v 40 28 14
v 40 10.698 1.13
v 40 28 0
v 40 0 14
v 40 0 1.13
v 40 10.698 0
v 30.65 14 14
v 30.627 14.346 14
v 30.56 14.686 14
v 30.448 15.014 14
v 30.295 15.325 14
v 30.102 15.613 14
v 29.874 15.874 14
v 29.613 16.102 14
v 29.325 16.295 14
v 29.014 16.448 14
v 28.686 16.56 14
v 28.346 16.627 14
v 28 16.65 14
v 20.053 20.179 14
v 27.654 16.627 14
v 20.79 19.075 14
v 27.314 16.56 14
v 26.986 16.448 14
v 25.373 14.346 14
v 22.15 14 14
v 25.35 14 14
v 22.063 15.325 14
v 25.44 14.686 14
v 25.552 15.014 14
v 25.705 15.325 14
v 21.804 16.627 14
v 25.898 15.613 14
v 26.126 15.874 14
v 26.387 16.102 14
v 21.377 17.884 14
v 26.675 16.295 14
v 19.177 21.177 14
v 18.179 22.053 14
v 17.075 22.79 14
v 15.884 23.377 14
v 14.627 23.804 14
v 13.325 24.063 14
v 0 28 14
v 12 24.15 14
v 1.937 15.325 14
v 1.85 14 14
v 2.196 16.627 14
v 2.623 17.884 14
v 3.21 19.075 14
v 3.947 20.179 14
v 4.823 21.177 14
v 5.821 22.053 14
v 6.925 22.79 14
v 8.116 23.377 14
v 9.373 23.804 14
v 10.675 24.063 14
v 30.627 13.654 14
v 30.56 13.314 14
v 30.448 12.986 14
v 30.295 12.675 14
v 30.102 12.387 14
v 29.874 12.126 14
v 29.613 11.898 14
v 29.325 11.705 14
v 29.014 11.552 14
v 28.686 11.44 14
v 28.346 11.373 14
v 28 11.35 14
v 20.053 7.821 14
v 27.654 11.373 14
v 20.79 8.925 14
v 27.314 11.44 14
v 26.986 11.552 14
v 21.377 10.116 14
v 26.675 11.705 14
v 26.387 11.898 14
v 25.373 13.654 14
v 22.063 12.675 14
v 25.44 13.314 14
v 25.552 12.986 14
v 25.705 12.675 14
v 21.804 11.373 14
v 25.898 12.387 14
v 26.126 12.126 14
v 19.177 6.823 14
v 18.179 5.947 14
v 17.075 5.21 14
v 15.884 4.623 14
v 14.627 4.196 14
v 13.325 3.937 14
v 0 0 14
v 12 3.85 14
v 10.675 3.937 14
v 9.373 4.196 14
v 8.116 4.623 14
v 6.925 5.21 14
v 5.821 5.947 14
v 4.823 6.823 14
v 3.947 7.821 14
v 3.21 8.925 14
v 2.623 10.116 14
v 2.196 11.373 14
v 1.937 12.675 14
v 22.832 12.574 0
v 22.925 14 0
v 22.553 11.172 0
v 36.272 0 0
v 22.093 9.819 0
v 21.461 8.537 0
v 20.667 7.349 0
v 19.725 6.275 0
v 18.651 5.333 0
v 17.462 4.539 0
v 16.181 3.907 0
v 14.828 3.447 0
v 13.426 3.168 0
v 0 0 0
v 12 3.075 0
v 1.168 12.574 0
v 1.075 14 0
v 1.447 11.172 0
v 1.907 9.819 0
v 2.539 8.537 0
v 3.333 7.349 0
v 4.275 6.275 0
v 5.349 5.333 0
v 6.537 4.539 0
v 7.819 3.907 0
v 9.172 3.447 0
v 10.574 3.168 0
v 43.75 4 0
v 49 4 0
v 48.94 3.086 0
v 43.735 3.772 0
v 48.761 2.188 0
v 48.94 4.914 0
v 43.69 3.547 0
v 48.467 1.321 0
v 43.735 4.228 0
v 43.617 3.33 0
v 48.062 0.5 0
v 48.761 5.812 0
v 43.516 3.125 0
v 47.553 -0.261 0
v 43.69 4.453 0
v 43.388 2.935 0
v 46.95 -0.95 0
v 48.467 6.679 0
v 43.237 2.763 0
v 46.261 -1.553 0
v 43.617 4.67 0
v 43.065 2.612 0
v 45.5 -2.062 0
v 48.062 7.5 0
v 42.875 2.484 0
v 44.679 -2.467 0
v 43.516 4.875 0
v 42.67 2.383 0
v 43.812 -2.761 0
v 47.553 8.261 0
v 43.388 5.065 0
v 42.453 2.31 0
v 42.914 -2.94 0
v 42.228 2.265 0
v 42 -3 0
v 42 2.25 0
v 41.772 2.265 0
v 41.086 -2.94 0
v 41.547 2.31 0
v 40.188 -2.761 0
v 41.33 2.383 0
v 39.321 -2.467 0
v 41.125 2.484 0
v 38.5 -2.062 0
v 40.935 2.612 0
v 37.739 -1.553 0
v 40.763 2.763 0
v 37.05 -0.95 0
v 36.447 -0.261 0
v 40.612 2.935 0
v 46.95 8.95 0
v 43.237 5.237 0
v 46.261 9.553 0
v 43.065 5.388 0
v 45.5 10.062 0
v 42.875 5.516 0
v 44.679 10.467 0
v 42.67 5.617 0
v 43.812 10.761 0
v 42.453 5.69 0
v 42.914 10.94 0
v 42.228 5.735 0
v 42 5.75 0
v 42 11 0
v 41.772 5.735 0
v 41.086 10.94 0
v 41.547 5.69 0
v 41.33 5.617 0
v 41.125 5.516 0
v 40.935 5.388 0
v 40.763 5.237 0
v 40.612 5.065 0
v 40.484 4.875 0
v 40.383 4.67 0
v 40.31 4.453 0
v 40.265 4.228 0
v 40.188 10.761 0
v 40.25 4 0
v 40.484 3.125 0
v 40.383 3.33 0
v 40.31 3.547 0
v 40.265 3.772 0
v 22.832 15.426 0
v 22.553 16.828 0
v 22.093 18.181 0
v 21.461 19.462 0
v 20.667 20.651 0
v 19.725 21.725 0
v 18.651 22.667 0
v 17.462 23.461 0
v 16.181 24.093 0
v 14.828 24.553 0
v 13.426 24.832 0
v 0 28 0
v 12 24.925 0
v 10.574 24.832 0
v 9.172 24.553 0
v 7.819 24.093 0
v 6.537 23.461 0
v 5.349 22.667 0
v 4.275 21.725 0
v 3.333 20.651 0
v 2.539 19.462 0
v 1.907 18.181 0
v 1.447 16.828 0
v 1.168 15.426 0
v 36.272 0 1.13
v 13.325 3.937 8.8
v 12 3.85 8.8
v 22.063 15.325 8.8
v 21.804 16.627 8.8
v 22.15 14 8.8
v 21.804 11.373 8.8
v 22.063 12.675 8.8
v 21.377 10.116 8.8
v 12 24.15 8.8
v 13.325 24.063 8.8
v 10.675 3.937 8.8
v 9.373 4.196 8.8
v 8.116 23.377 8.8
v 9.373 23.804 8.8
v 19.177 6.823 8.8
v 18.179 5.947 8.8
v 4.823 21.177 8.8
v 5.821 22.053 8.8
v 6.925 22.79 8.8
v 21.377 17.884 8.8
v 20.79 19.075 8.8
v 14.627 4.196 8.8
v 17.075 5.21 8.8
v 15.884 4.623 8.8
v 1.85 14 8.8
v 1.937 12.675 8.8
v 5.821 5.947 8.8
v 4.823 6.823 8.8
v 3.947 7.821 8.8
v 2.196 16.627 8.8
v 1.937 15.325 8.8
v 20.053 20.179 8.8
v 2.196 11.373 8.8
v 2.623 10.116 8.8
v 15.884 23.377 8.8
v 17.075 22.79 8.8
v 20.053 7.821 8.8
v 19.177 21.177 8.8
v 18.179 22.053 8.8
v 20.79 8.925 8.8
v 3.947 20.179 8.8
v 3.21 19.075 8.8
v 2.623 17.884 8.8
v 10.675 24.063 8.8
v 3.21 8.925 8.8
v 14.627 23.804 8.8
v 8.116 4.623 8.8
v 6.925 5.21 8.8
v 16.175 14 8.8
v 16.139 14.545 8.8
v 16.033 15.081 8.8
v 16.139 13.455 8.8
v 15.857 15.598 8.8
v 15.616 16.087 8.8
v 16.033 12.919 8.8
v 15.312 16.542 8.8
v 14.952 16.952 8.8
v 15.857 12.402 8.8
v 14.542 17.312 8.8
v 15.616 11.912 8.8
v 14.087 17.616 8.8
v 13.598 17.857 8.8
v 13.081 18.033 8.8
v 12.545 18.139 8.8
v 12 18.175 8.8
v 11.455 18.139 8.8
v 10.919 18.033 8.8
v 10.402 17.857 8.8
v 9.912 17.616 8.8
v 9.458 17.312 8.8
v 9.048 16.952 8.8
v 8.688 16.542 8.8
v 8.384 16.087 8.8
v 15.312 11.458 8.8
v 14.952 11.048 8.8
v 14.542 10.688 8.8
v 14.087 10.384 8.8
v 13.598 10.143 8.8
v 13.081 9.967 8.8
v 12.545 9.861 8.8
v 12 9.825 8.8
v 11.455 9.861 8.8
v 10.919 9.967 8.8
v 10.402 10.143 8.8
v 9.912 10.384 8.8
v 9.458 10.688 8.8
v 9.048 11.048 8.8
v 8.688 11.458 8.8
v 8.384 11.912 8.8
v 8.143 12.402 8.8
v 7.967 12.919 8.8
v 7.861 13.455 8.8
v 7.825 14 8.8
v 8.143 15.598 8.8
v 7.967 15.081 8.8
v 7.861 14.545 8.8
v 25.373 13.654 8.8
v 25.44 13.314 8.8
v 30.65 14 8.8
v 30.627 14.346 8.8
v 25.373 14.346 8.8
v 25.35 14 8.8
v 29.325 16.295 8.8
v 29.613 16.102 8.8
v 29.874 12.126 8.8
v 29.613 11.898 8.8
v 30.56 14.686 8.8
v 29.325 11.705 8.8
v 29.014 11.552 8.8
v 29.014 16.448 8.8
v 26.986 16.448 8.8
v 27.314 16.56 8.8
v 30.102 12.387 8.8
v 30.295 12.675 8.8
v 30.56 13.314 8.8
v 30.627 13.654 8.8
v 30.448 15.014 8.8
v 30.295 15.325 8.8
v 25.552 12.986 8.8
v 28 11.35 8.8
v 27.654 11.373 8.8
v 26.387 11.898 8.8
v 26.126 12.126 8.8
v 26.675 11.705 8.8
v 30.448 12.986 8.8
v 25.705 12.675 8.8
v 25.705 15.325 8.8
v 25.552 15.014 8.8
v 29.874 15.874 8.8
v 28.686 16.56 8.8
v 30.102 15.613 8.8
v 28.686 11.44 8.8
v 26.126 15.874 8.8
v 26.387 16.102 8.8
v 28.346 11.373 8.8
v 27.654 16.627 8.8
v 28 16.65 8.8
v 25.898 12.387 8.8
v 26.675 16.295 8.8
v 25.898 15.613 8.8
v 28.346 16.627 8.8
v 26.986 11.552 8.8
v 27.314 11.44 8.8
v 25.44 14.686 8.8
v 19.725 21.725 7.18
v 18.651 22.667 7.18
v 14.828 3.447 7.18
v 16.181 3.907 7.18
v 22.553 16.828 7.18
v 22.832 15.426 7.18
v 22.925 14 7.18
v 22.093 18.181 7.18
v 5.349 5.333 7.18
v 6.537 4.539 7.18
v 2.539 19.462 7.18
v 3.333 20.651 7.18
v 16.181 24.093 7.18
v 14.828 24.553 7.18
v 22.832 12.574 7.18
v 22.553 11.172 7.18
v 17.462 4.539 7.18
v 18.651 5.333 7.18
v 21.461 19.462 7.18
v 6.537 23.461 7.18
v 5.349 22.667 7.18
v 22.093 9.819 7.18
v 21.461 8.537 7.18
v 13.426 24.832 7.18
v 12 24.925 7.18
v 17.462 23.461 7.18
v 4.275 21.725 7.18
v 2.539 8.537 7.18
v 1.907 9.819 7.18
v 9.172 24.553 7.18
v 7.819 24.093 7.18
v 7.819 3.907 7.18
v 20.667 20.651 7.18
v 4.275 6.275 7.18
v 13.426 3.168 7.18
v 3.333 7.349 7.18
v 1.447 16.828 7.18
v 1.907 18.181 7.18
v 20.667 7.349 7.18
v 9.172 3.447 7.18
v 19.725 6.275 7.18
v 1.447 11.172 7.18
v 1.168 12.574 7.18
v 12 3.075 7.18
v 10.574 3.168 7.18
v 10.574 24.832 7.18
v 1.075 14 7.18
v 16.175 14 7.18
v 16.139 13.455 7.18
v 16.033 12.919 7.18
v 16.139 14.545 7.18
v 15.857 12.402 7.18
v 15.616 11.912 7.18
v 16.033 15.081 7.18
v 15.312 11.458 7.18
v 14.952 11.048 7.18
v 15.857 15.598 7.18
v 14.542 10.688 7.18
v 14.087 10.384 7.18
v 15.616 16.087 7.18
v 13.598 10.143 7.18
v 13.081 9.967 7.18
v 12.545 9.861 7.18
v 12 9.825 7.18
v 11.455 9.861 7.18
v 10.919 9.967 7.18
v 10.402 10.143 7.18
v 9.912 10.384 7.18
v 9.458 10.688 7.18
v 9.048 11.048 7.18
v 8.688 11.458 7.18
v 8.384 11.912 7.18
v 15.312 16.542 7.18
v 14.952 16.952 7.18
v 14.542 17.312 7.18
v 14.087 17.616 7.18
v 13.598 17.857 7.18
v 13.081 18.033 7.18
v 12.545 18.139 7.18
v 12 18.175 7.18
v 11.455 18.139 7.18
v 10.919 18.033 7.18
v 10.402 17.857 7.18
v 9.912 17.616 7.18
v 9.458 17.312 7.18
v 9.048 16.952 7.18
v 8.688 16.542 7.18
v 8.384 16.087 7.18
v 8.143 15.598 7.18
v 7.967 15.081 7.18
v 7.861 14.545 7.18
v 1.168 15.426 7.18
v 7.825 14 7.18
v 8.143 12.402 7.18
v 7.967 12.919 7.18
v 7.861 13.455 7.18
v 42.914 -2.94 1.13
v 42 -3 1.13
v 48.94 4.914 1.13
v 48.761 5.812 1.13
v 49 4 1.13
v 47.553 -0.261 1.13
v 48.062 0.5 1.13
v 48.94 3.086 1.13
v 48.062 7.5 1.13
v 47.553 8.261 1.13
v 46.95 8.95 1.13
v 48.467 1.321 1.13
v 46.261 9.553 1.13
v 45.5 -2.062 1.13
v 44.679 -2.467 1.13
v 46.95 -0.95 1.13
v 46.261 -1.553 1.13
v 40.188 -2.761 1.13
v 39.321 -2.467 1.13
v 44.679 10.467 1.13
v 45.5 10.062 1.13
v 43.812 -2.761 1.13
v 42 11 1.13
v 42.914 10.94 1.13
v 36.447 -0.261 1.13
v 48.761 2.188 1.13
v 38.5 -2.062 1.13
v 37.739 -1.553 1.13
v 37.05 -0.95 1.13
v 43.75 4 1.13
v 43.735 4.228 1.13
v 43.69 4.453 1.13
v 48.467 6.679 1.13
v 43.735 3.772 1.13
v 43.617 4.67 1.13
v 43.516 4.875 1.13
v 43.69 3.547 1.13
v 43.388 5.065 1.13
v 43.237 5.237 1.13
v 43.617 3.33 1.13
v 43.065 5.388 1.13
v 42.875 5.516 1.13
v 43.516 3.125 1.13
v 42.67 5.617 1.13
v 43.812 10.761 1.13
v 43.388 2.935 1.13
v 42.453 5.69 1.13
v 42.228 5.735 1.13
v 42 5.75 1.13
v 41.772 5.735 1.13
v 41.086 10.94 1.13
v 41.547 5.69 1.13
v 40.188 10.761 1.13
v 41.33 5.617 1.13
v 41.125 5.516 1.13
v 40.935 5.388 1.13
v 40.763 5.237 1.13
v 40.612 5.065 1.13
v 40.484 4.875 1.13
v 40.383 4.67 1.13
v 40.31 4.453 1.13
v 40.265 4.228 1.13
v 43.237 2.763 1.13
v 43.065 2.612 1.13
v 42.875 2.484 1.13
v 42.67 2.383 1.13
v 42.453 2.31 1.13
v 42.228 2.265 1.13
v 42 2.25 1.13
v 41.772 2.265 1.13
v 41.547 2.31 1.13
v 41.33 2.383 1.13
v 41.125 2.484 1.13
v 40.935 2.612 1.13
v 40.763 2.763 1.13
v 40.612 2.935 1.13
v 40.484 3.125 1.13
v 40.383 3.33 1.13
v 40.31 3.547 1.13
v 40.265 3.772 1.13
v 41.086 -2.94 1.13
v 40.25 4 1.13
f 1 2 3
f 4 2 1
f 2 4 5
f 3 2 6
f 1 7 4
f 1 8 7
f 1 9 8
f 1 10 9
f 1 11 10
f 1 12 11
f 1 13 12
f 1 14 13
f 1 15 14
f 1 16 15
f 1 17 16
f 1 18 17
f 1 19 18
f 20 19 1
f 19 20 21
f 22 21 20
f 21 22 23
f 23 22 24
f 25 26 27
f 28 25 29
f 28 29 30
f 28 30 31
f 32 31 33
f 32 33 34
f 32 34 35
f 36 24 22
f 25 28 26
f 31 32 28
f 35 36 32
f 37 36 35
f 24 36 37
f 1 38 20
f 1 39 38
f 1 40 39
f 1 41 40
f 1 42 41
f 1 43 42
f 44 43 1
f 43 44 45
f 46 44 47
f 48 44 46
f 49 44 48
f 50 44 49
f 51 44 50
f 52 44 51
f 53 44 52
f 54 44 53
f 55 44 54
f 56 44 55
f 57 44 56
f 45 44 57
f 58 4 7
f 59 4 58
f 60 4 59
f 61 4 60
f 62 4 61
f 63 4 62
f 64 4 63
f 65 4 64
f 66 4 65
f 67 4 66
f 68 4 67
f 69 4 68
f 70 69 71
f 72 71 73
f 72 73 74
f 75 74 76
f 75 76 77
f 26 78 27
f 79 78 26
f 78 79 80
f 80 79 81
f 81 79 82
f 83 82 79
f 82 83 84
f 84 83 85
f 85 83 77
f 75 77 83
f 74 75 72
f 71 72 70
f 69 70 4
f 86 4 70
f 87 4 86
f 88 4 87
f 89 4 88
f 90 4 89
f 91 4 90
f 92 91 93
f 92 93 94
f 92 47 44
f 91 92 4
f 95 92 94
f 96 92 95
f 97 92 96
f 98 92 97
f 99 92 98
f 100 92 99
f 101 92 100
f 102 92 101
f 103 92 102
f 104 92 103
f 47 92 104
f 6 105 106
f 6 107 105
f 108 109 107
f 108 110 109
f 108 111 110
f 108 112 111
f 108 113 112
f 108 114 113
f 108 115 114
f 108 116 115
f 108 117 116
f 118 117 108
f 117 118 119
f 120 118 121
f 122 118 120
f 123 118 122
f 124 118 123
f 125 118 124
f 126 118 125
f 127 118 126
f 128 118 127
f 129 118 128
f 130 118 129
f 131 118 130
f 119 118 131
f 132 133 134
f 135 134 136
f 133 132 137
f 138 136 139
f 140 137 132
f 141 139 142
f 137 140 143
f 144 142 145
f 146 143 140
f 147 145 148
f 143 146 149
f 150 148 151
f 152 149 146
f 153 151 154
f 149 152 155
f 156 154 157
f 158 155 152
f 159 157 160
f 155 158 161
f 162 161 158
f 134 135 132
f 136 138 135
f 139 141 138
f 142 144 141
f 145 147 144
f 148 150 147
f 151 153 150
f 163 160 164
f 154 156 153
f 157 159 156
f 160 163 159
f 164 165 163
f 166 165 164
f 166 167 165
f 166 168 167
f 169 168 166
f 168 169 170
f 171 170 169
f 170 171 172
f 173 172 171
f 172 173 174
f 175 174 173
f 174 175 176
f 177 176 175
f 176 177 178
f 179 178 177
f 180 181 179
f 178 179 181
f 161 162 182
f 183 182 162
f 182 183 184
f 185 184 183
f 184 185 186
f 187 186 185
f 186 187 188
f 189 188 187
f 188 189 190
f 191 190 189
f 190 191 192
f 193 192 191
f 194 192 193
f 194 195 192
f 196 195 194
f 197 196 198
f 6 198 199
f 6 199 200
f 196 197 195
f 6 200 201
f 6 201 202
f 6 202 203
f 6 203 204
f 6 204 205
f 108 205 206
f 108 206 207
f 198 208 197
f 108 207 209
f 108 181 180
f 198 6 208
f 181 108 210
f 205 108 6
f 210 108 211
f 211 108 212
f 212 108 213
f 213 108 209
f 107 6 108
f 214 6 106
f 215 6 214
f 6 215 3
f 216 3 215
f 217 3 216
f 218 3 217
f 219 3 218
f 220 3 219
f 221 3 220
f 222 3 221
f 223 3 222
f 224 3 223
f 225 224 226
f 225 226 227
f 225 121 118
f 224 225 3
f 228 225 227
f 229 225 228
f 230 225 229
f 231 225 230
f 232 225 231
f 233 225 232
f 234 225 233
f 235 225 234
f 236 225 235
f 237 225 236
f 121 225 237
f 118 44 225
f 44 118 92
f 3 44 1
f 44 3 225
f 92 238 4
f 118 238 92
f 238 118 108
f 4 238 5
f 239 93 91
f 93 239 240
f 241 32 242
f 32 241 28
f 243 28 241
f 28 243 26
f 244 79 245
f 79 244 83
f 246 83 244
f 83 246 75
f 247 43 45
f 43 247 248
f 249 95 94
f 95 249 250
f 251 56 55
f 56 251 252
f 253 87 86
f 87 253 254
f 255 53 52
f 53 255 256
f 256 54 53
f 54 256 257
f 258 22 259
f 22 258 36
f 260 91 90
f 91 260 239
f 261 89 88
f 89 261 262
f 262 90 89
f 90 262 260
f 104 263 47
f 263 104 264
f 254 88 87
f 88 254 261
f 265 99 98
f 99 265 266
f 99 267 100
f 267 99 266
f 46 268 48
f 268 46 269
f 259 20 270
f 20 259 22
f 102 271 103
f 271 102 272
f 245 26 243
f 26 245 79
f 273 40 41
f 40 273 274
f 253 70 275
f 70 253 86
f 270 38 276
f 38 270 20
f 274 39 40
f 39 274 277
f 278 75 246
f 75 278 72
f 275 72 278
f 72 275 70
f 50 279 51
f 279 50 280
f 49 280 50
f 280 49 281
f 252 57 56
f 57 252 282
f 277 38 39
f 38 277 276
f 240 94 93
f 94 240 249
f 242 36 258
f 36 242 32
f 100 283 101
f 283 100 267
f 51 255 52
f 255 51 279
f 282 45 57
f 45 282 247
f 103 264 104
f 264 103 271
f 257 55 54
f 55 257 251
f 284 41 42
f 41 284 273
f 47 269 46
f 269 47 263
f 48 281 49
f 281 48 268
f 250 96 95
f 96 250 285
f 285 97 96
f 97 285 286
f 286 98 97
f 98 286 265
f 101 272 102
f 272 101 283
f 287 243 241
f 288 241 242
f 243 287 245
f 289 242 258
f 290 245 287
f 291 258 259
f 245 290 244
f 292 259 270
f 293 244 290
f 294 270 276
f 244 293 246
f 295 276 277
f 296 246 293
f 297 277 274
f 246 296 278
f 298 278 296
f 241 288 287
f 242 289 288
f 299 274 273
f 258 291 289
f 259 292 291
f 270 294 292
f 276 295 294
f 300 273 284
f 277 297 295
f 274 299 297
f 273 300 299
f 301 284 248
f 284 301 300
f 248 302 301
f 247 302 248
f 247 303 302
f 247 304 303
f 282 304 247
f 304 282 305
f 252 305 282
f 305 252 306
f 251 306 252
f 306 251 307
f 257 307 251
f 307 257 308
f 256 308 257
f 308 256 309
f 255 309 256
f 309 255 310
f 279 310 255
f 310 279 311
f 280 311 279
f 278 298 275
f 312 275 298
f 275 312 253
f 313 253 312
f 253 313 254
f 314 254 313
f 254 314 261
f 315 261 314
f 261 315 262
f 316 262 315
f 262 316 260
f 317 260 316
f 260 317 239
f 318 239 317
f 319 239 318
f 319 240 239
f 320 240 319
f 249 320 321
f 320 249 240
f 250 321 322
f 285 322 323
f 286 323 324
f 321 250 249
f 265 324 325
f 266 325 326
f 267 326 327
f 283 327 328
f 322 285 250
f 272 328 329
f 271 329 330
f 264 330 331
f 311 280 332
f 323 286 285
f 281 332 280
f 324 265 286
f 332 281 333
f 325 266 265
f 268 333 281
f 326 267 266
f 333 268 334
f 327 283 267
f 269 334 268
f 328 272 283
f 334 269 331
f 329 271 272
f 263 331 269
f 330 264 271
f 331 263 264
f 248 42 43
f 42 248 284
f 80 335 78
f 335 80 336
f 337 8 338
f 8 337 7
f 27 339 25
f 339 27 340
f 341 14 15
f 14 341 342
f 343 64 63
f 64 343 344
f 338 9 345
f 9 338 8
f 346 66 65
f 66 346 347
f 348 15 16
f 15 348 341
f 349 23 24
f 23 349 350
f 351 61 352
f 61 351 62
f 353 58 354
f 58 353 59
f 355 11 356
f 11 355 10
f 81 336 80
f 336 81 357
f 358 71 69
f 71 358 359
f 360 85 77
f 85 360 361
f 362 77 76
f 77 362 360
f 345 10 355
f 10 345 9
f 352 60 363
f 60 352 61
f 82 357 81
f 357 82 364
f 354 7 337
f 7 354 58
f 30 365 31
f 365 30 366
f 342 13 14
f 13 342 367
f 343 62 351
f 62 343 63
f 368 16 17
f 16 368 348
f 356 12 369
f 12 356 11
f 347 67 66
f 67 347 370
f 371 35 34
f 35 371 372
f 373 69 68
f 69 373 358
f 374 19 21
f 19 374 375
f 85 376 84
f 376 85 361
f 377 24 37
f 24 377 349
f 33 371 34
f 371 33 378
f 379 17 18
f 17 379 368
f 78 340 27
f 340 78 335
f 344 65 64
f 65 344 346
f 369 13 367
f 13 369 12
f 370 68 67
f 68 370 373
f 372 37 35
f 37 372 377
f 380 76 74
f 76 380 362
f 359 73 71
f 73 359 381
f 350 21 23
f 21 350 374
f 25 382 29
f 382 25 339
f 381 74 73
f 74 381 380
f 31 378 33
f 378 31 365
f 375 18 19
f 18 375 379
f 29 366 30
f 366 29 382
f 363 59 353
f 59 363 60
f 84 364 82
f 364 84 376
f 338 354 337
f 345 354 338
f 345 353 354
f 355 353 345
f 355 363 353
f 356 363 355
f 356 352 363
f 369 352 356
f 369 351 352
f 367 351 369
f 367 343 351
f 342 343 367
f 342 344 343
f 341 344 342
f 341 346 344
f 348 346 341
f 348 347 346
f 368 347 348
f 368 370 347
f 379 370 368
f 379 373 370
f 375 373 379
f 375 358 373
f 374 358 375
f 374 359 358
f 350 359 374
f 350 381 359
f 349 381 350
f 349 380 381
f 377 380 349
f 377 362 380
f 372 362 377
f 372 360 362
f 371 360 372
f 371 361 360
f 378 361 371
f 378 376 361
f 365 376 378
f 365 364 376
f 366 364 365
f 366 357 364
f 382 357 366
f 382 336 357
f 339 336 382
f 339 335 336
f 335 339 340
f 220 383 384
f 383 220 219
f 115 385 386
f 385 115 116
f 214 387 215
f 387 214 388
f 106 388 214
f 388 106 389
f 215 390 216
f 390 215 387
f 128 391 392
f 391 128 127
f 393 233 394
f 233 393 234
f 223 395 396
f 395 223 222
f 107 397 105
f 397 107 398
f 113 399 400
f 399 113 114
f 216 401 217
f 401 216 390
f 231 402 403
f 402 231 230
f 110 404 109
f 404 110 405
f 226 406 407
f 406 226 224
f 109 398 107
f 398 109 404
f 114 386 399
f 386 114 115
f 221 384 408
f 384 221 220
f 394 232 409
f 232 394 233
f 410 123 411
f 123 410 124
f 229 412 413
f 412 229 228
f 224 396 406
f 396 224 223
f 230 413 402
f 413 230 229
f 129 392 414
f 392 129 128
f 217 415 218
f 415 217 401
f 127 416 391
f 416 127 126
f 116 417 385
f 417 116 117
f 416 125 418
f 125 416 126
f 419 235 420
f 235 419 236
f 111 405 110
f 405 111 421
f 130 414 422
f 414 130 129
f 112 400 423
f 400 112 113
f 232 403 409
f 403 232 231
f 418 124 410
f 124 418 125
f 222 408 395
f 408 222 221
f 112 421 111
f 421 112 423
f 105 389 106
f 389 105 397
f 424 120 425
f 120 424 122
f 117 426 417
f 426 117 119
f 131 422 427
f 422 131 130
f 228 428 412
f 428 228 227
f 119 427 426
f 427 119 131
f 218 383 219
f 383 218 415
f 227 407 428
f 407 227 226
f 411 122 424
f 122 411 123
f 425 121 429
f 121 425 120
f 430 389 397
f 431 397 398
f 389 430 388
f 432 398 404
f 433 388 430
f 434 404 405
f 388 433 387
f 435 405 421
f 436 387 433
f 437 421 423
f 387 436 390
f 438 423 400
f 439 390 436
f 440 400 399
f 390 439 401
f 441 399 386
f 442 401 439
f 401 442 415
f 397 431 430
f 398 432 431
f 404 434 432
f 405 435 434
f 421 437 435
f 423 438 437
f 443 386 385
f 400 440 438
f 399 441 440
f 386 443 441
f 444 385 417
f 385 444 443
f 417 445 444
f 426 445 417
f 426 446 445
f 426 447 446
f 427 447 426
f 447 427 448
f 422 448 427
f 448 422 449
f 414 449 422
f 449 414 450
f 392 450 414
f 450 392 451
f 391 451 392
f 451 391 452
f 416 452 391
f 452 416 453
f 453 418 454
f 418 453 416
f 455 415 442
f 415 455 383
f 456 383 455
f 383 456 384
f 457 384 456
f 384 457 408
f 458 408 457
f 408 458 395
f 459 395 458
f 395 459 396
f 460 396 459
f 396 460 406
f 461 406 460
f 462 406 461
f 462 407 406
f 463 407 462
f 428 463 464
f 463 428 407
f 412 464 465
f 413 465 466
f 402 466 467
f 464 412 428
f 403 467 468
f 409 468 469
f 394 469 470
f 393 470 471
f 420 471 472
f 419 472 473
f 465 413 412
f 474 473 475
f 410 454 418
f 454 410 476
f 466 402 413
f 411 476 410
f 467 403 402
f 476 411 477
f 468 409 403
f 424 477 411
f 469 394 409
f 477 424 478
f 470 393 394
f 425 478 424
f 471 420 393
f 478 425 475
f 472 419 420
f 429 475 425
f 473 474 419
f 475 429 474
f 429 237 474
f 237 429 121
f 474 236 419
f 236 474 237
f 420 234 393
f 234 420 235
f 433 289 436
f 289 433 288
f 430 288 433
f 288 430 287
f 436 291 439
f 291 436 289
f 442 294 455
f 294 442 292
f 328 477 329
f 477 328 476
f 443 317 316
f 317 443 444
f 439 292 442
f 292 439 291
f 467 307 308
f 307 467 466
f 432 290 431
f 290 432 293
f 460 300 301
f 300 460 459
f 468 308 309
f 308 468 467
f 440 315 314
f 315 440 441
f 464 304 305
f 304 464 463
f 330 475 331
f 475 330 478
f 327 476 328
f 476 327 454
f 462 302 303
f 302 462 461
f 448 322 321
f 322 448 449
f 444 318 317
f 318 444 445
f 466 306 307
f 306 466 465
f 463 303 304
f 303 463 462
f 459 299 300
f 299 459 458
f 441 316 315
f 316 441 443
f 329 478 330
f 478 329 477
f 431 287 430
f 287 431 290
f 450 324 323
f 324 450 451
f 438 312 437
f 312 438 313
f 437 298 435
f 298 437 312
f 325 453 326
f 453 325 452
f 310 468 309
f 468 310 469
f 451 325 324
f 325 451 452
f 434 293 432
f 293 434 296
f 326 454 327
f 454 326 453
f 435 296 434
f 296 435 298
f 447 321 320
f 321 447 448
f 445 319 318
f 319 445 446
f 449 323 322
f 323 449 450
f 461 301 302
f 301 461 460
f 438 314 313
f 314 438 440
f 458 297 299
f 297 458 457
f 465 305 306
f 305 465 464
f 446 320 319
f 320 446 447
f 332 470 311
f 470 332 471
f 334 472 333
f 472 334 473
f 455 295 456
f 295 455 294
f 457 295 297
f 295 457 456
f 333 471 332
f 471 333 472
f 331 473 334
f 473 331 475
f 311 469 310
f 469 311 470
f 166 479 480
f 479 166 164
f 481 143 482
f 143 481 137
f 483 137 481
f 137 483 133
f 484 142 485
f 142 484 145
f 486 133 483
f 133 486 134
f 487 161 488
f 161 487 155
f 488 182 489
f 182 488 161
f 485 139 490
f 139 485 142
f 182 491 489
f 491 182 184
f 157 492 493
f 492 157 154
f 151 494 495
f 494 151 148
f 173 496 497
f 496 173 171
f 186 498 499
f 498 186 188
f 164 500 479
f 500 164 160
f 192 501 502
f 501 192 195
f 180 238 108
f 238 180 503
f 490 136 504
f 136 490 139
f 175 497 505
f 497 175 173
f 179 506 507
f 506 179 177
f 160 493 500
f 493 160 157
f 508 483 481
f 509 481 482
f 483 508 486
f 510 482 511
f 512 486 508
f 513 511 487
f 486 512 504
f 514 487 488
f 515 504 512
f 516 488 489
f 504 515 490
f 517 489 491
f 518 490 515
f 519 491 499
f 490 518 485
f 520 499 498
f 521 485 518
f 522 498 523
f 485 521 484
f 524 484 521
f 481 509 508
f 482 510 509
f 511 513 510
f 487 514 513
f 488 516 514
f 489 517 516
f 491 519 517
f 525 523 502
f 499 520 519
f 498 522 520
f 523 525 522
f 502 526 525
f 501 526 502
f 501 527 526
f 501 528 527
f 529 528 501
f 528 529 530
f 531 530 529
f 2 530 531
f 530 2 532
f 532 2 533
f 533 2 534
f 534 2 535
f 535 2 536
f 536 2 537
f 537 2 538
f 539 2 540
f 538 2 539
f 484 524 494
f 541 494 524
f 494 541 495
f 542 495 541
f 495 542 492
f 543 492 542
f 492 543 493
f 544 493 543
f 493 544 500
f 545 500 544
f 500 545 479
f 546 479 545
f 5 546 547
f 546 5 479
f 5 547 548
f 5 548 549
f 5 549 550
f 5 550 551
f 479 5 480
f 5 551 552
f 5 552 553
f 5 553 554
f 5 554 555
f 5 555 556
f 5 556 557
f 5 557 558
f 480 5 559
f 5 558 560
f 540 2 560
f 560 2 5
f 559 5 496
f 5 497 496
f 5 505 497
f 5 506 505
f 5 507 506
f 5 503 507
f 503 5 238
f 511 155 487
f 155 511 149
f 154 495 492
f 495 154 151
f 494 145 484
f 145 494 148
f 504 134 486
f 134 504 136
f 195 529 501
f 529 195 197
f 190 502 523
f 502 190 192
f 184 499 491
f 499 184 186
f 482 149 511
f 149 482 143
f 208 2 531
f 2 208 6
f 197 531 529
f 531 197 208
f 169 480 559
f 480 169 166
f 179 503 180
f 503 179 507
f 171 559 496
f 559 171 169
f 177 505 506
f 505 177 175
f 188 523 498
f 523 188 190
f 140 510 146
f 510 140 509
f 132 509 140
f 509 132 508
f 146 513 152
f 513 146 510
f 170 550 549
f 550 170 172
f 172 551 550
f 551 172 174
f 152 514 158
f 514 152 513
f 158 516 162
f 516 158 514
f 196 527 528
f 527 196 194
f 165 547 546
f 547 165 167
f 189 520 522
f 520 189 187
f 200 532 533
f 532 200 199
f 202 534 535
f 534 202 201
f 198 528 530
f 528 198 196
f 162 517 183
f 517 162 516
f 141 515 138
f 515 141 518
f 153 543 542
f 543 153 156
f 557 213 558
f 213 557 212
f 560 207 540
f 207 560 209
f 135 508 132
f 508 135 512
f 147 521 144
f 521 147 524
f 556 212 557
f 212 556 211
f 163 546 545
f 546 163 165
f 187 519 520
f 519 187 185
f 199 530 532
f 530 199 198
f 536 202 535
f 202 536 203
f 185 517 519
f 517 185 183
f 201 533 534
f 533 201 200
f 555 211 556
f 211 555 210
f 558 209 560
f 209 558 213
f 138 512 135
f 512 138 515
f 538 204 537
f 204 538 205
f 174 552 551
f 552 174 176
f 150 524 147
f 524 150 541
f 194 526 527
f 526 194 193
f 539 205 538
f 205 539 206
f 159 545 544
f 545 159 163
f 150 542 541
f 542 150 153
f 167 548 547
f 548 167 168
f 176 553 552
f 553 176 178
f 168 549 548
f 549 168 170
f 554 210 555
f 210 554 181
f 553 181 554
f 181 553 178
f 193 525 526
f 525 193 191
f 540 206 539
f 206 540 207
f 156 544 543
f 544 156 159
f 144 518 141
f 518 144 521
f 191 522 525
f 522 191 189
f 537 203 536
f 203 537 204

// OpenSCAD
// file: parameters.scad
// =============================================================================
// Gen-AW Dual-rotor copper-centroid pico AFPM - WOUND-AWARE (HARD GATE)
// PRIMARY challenger vs Gen-AT. Magnets @ R=38.0 + 215 t + former_web 1.20 -> m2m 4.66.
// =============================================================================

// --- Wire / wind budget (26 AWG, ~1 lb spool ~ 390 m bare-equiv) --------------
wire_awg            = 26;
wire_od             = 0.45;     // insulated OD mm
turns               = 215;      // +5 vs Gen-AT 210
fill                = 0.70;
layers_per_face     = 2;        // axial layers proud of EACH flange
wind_build_axial    = layers_per_face * wire_od * fill;   // 0.63 mm
wind_build_radial   = 3 * wire_od * fill;                 // 0.945 mm

// --- Pancake former (bare STL) -----------------------------------------------
coil_id_r           = 14.0;     // copper-centroid window centered ~R=38.0
coil_od_r           = 62.0;
span_deg            = 26.0;     // 12 stations x 30 deg pitch
former_web          = 1.20;     // print floor for LB walls (was AT 1.22)
flange_t            = 0.60;
wall                = 1.2;
slot_w              = 2.4;
mount_hole          = 3.5;
tab_len             = 7.0;

former_bare_h       = former_web + 2 * flange_t;            // 2.40 mm
coil_envelope_h     = former_bare_h + 2 * wind_build_axial; // 3.66 mm

// --- Running clearance (magnet face -> WOUND face) EACH side ------------------
run_clear           = 0.50;     // PASS floor >= 0.5
gap_spacer_h        = run_clear + wind_build_axial;         // 1.13 mm
m2m                 = coil_envelope_h + 2 * run_clear;      // 4.66 mm (beats Gen-AT 4.68)

// --- Mid stator (12 pancakes 3ph; winds proud both faces) ---------------------
coil_stations       = 12;
bay_r_in            = coil_id_r - 2.0 - wind_build_radial;
bay_r_out           = coil_od_r + 2.0 + wind_build_radial;
bay_span            = span_deg + 4.0;
bay_offset          = 2.0;
stator_thick        = former_bare_h;                        // winds proud +/-Z
stator_od           = 160.0;
shaft_clear_stator  = 34.0;
coil_mount_r        = 25.0;

// --- Rotors (x2) - 8xO20 @ R=38.0 (copper centroid) + 24xO5 Halbach ----------
large_pocket_d      = 20.3;
small_pocket_d      = 5.3;
pocket_h            = 5.2;
large_n             = 8;
R_large             = 38.0;     // covers ~28-48 over copper centroid ~38.0
R_small_inner       = 23.0;
R_small_mid         = 38.0;
R_small_outer       = 55.0;
carrier_od          = 156.0;
carrier_thick       = 7.5;
hub_h               = 10.0;
hub_od              = 30.0;
rotor_b_offset_deg  = 22.5;

// --- Modular MAX interface (Gen-E family) ------------------------------------
shaft_bore          = 8.35;
bearing_d           = 21.85;
bearing_h           = 7.2;
m3_clear            = 3.5;
bolt_r_inner        = 36.0;
bolt_n_inner        = 6;
flange_bolt_r       = 72.0;
flange_bolt_n       = 6;
brace_r             = 68.0;
brace_d             = 4.3;
brace_n             = 4;

spacer_pad_od       = 14.0;
spacer_pad_id       = m3_clear;
endbell_od          = 160.0;
endbell_thick       = 8.0;
endbell_shaft_clear = 10.0;

$fn = 64;
// main file
// Gen-AW fit coupon — magnet pockets + 608 + spacer height
include <parameters.scad>;
$fn = 48;
block_w = 40; block_d = 28; block_h = 14;
difference() {
    cube([block_w, block_d, block_h]);
    translate([12, block_d/2, block_h - pocket_h])
        cylinder(d=large_pocket_d, h=pocket_h + 0.2);
    translate([28, block_d/2, block_h - pocket_h])
        cylinder(d=small_pocket_d, h=pocket_h + 0.2);
    translate([12, block_d/2, -0.02])
        cylinder(d=bearing_d, h=bearing_h);
    translate([12, block_d/2, -0.1])
        cylinder(d=shaft_bore, h=block_h + 1);
}
translate([block_w + 2, 4, 0])
    difference() {
        cylinder(d=spacer_pad_od, h=gap_spacer_h);
        translate([0, 0, -0.1]) cylinder(d=spacer_pad_id, h=gap_spacer_h + 0.2);
    }
